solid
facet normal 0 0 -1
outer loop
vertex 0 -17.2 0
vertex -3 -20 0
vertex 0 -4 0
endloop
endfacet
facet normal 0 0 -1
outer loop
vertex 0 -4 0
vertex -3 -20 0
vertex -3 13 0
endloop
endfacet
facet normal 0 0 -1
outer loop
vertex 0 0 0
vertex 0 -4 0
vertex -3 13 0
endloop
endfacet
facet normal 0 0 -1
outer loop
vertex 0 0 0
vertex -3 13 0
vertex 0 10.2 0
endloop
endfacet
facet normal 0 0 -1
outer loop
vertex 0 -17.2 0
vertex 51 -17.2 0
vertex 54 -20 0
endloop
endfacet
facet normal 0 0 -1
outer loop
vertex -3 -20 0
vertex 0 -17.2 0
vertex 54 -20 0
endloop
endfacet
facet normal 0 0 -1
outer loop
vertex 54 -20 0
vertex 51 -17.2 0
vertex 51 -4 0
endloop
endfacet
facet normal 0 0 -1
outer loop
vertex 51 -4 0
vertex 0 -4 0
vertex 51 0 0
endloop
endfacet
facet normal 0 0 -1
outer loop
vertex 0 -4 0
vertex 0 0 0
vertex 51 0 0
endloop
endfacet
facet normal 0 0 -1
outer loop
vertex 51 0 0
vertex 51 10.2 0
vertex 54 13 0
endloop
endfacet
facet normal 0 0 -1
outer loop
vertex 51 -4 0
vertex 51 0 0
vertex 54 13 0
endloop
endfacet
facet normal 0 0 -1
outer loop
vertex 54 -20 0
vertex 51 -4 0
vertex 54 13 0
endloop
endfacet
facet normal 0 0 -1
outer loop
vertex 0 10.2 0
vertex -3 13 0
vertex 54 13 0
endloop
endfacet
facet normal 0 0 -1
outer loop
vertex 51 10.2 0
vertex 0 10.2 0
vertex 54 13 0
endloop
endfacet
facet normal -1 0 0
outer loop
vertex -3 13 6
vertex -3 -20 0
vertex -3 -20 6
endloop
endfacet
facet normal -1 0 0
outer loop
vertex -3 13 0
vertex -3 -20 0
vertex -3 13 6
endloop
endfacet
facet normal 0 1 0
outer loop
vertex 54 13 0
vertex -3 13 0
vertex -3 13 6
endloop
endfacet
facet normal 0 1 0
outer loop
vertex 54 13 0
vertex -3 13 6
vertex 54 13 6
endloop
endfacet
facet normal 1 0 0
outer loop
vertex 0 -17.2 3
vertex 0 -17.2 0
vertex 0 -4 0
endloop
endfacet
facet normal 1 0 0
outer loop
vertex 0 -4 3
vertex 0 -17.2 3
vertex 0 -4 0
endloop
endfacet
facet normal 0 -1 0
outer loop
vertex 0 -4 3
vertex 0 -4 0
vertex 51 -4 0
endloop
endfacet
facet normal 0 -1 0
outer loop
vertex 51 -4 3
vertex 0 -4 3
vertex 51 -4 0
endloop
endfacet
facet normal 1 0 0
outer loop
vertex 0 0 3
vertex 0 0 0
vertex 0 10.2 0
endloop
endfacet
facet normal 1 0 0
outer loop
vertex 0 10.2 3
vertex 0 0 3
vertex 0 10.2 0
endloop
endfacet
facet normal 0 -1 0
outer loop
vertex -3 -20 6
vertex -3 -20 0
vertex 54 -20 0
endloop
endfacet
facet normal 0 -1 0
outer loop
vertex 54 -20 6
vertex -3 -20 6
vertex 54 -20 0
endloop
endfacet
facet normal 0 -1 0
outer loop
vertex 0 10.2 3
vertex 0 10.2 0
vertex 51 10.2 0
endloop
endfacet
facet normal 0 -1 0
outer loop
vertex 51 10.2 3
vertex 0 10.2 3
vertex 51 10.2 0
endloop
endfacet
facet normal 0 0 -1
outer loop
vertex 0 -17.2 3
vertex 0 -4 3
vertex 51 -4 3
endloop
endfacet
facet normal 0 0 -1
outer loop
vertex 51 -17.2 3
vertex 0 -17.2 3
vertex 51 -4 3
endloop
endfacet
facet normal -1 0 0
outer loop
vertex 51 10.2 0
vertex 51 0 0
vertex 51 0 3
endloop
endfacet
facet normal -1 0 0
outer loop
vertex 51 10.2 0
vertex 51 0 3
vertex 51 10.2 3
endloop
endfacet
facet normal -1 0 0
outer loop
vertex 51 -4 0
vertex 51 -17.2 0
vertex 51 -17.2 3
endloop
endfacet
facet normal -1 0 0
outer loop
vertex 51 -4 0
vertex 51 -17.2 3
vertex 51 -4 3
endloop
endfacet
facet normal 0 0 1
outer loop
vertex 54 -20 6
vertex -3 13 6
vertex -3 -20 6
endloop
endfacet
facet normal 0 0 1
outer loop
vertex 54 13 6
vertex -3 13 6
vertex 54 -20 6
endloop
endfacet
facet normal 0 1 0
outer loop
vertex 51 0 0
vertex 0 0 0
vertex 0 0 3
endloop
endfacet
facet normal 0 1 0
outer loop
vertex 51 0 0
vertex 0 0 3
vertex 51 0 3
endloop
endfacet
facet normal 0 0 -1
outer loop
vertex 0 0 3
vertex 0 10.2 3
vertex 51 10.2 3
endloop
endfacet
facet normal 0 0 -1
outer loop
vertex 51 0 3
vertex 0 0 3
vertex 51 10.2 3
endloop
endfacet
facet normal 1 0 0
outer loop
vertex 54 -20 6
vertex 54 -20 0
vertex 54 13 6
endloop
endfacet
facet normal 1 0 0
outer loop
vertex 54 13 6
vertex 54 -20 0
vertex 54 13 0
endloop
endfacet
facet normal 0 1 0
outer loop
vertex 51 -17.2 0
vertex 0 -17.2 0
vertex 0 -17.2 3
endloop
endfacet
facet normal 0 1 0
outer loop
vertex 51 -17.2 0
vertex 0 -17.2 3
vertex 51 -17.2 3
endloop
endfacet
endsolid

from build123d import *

# Parameters (mm, degrees)
BOX_W        = 51
BOX_H        = 10.2
BOX_DEPTH    = 10
BOX001_W     = 51
BOX001_H     = 13.2
BOX001_DEPTH = 10
BOX002_W     = 57
BOX002_H     = 33
BOX002_DEPTH = 6


with BuildPart() as cube:
    # Box → Box (new body)
    with BuildSketch(Plane.XY.offset(-7)):
        with Locations((25.5, 5.1)):
            Rectangle(BOX_W, BOX_H)
    extrude(amount=BOX_DEPTH)


with BuildPart() as fusion:
    # Box001 → Box001 (new body)
    with BuildSketch(Plane(origin=(0, -17.2, -7), x_dir=(1, 0, 0), z_dir=(0, 0, 1))):
        with Locations((25.5, 6.6)):
            Rectangle(BOX001_W, BOX001_H)
    extrude(amount=BOX001_DEPTH)

    # Fusion: union Cube
    add(cube.part)


with BuildPart() as cut:
    # Box002 → Box002 (new body)
    with BuildSketch(Plane(origin=(-3, -20, 0), x_dir=(1, 0, 0), z_dir=(0, 0, 1))):
        with Locations((28.5, 16.5)):
            Rectangle(BOX002_W, BOX002_H)
    extrude(amount=BOX002_DEPTH)

    # Cut: cut Fusion
    add(fusion.part, mode=Mode.SUBTRACT)


solid = cut.part
